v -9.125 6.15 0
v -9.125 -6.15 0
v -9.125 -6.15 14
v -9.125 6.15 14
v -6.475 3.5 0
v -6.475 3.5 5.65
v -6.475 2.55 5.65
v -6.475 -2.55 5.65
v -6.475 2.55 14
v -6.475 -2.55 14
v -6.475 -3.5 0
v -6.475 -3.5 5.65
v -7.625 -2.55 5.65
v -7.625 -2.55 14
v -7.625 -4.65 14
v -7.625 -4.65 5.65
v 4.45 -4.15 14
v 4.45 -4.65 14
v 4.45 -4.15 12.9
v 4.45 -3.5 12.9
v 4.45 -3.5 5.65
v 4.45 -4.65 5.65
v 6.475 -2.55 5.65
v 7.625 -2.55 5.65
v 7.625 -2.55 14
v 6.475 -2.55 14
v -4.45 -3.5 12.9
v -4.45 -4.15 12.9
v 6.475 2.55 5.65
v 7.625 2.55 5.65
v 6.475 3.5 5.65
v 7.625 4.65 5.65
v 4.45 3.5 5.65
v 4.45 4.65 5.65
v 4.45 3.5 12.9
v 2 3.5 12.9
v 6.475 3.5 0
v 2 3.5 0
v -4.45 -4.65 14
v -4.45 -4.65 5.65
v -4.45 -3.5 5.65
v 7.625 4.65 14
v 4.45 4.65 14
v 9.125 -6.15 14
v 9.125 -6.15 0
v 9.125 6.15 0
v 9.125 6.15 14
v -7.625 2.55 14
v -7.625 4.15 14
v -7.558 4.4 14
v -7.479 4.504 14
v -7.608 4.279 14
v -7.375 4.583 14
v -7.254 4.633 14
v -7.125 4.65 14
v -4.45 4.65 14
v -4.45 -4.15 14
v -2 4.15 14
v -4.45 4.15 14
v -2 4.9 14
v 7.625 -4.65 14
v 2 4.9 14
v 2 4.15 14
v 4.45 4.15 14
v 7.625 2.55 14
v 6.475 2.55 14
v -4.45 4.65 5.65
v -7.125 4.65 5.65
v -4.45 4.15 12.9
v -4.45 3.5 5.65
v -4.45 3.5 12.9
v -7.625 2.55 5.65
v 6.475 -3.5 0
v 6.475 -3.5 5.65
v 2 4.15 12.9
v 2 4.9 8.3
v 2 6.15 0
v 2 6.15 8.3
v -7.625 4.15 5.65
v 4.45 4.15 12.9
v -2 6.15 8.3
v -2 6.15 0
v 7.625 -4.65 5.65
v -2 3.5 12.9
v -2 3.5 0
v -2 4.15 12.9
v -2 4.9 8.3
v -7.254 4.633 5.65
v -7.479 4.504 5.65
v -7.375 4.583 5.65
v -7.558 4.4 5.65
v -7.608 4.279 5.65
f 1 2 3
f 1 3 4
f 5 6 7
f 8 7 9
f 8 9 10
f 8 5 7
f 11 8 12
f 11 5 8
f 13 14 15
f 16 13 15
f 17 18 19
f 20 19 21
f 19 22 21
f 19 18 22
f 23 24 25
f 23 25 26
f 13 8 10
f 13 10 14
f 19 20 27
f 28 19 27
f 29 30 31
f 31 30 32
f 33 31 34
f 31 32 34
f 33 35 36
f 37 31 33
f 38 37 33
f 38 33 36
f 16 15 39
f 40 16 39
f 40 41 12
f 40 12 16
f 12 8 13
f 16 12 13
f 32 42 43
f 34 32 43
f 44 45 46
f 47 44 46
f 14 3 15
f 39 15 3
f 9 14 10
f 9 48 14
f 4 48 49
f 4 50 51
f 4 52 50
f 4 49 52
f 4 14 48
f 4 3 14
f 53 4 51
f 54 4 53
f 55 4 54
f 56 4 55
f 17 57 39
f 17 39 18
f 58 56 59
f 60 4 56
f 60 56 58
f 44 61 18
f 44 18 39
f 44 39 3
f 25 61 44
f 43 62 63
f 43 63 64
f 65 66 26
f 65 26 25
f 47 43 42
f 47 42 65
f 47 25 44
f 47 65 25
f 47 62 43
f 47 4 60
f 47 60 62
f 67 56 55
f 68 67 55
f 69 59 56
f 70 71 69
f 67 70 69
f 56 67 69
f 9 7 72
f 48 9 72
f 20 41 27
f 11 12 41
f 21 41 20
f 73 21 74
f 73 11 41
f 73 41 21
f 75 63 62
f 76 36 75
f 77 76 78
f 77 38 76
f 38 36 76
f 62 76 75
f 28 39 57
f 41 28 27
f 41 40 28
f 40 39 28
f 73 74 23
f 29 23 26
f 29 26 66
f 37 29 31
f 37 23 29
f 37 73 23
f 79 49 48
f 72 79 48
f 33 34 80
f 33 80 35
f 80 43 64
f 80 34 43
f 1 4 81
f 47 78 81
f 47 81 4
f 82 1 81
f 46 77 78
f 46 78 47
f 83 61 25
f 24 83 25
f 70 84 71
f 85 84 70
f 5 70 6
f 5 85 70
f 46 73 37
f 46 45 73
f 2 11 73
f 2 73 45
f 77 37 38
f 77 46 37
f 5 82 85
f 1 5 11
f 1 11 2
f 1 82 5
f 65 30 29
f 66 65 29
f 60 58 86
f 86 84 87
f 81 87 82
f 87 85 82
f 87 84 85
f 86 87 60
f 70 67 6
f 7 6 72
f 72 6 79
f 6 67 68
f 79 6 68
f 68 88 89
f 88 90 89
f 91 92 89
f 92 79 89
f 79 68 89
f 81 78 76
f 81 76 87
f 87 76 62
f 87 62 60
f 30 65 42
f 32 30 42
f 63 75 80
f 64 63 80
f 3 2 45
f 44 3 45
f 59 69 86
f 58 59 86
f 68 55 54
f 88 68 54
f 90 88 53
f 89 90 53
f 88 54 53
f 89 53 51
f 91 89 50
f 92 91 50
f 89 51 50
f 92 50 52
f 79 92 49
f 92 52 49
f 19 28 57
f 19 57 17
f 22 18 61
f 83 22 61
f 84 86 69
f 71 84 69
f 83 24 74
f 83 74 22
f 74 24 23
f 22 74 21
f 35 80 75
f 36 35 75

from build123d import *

# Parameters (mm, degrees)
SKETCH1_W               = 18.25
SKETCH1_H               = 12.3
SKETCH1_W_2             = 14.25
SKETCH1_H_2             = 8.3
BOSS_EXTRUDE1_DEPTH     = 14
SKETCH4_W               = 8.9
SKETCH4_H               = 0.65
BOSS_EXTRUDE2_DEPTH     = 12.9
SKETCH4_3_W             = 0.65
SKETCH4_3_H             = 5.1
BOSS_EXTRUDE3_DEPTH     = 14
SKETCH5_W               = 4
SKETCH5_H               = 2.65
CUT_EXTRUDE2_DEPTH      = 8.3
BOSS_EXTRUDE4_DEPTH     = 5.65
SKETCH7_W               = 4
SKETCH7_H               = 1.4
CUT_EXTRUDE3_DEPTH      = 6.7
SKETCH8_R               = 0.5
CUT_EXTRUDE4_DEPTH      = 8.35
MIRROR2_COPY_1_SKETCH_R = 0.5
MIRROR2_COPY_1_DEPTH    = 8.35
CUT_EXTRUDE5_DEPTH      = 8.35


with BuildPart() as part:
    # Sketch1 → Boss-Extrude1 (new body)
    with BuildSketch(Plane.XY):
        Rectangle(SKETCH1_W, SKETCH1_H)
        Rectangle(SKETCH1_W_2, SKETCH1_H_2, mode=Mode.SUBTRACT)
    extrude(amount=BOSS_EXTRUDE1_DEPTH)

    # Sketch4 → Boss-Extrude2 (add)
    with BuildSketch(Plane(origin=(0, 0, 0), x_dir=(-1, 0, 0), z_dir=(0, 0, -1))):
        with Locations((0, 3.825)):
            Rectangle(SKETCH4_W, SKETCH4_H)
        with Locations((0, -3.825)):
            Rectangle(SKETCH4_W, SKETCH4_H)
    extrude(amount=-BOSS_EXTRUDE2_DEPTH)

    # Sketch4<3> → Boss-Extrude3 (add)
    with BuildSketch(Plane(origin=(0, 0, 0), x_dir=(-1, 0, 0), z_dir=(0, 0, -1))):
        with Locations((-6.8, 0)):
            Rectangle(SKETCH4_3_W, SKETCH4_3_H)
        with Locations((6.8, 0)):
            Rectangle(SKETCH4_3_W, SKETCH4_3_H)
    extrude(amount=-BOSS_EXTRUDE3_DEPTH)

    # Sketch5 → Cut-Extrude2 (cut)
    with BuildSketch(Plane(origin=(0, 0, 0), x_dir=(-1, 0, 0), z_dir=(0, 0, -1))):
        with Locations((0, 4.825)):
            Rectangle(SKETCH5_W, SKETCH5_H)
    extrude(amount=-CUT_EXTRUDE2_DEPTH, mode=Mode.SUBTRACT)

    # Sketch6 → Boss-Extrude4 (add)
    with BuildSketch(Plane(origin=(0, 0, 0), x_dir=(-1, 0, 0), z_dir=(0, 0, -1))):
        Polygon((6.475, -3.5), (4.45, -3.5), (4.45, -4.15), (7.125, -4.15), (7.125, -2.55), (6.475, -2.55), align=None)
        Polygon((6.475, 3.5), (6.475, 2.55), (7.125, 2.55), (7.125, 4.15), (4.45, 4.15), (4.45, 3.5), align=None)
        Polygon((-7.125, 2.55), (-6.475, 2.55), (-6.475, 3.5), (-4.45, 3.5), (-4.45, 4.15), (-7.125, 4.15), align=None)
        Polygon((-4.45, -4.15), (-4.45, -3.5), (-6.475, -3.5), (-6.475, -2.55), (-7.125, -2.55), (-7.125, -4.15), align=None)
    extrude(amount=-BOSS_EXTRUDE4_DEPTH)

    # Sketch7 → Cut-Extrude3 (cut, through all)
    with BuildSketch(Plane(origin=(0, 0, 8.3), x_dir=(-1, 0, 0), z_dir=(0, 0, -1))):
        with Locations((0, 4.2)):
            Rectangle(SKETCH7_W, SKETCH7_H)
    extrude(amount=-CUT_EXTRUDE3_DEPTH, mode=Mode.SUBTRACT)

    # Sketch8 → Cut-Extrude4 (cut)
    with BuildSketch(Plane.XY.offset(14)):
        with Locations((-7.125, 4.15)):
            Circle(SKETCH8_R)
    cut_extrude4 = extrude(amount=-CUT_EXTRUDE4_DEPTH, mode=Mode.SUBTRACT)

    # Mirror1: Cut-Extrude4 across plane
    add(cut_extrude4.mirror(Plane.ZX), mode=Mode.SUBTRACT)

    # Mirror2: Cut-Extrude4 across plane
    add(cut_extrude4.mirror(Plane(origin=(0, 0, 0), x_dir=(0, 0, 1), z_dir=(1, 0, 0))), mode=Mode.SUBTRACT)

    # Mirror2 copy 1 sketch → Mirror2 copy 1 (cut)
    with BuildSketch(Plane(origin=(0, 0, 14), x_dir=(-1, 0, 0), z_dir=(0, 0, 1))):
        with Locations((-7.125, 4.15)):
            Circle(MIRROR2_COPY_1_SKETCH_R)
    extrude(amount=-MIRROR2_COPY_1_DEPTH, mode=Mode.SUBTRACT)

    # Sketch9 → Cut-Extrude5 (cut)
    with BuildSketch(Plane.XY.offset(14)):
        with BuildLine():
            ThreePointArc((-7.625, -4.15), (-7.478553391, -4.503553391), (-7.125, -4.65))
            ThreePointArc((-7.125, -4.65), (-6.771446609, -4.503553391), (-6.625, -4.15))
            Line((-6.625, -4.15), (-4.45, -4.15))
            Line((-4.45, -4.15), (-4.45, -2.55))
            Line((-4.45, -2.55), (-6.475, -2.55))
            Line((-6.475, -2.55), (-7.125, -2.55))
            Line((-7.125, -2.55), (-7.125, -3.65))
            ThreePointArc((-7.125, -3.65), (-7.478553391, -3.796446609), (-7.625, -4.15))
        make_face()
        with BuildLine():
            ThreePointArc((-6.625, -4.15), (-6.771446609, -4.503553391), (-7.125, -4.65))
            Line((-7.125, -4.65), (-4.45, -4.65))
            Line((-4.45, -4.65), (-4.45, -4.15))
            Line((-4.45, -4.15), (-6.625, -4.15))
        make_face()
        with BuildLine():
            Line((-7.625, -2.55), (-7.625, -4.15))
            ThreePointArc((-7.625, -4.15), (-7.478553391, -3.796446609), (-7.125, -3.65))
            Line((-7.125, -3.65), (-7.125, -2.55))
            Line((-7.125, -2.55), (-7.625, -2.55))
        make_face()
        with BuildLine():
            Line((-7.625, 4.15), (-7.625, 2.55))
            Line((-7.625, 2.55), (-7.125, 2.55))
            Line((-7.125, 2.55), (-7.125, 3.65))
            ThreePointArc((-7.125, 3.65), (-7.478553391, 3.796446609), (-7.625, 4.15))
        make_face()
        with BuildLine():
            Line((-4.45, 4.65), (-7.125, 4.65))
            ThreePointArc((-7.125, 4.65), (-6.771446609, 4.503553391), (-6.625, 4.15))
            Line((-6.625, 4.15), (-4.45, 4.15))
            Line((-4.45, 4.15), (-4.45, 4.65))
        make_face()
        with BuildLine():
            ThreePointArc((7.125, -3.65), (7.478553391, -3.796446609), (7.625, -4.15))
            Line((7.625, -4.15), (7.625, -2.55))
            Line((7.625, -2.55), (7.125, -2.55))
            Line((7.125, -2.55), (7.125, -3.65))
        make_face()
        with BuildLine():
            Line((6.625, -4.15), (4.45, -4.15))
            Line((4.45, -4.15), (4.45, -4.65))
            Line((4.45, -4.65), (7.125, -4.65))
            ThreePointArc((7.125, -4.65), (6.771446609, -4.503553391), (6.625, -4.15))
        make_face()
        with BuildLine():
            Line((4.45, -2.55), (4.45, -4.15))
            Line((4.45, -4.15), (6.625, -4.15))
            ThreePointArc((6.625, -4.15), (6.771446609, -4.503553391), (7.125, -4.65))
            ThreePointArc((7.125, -4.65), (7.478553391, -4.503553391), (7.625, -4.15))
            ThreePointArc((7.625, -4.15), (7.478553391, -3.796446609), (7.125, -3.65))
            Line((7.125, -3.65), (7.125, -2.55))
            Line((7.125, -2.55), (6.475, -2.55))
            Line((6.475, -2.55), (4.45, -2.55))
        make_face()
        with BuildLine():
            ThreePointArc((7.625, -4.15), (7.478553391, -4.503553391), (7.125, -4.65))
            Line((7.125, -4.65), (7.625, -4.65))
            Line((7.625, -4.65), (7.625, -4.15))
        make_face()
        with BuildLine():
            Line((7.625, 4.65), (7.125, 4.65))
            ThreePointArc((7.125, 4.65), (7.478553391, 4.503553391), (7.625, 4.15))
            Line((7.625, 4.15), (7.625, 4.65))
        make_face()
        with BuildLine():
            Line((7.625, 2.55), (7.625, 4.15))
            ThreePointArc((7.625, 4.15), (7.478553391, 3.796446609), (7.125, 3.65))
            Line((7.125, 3.65), (7.125, 2.55))
            Line((7.125, 2.55), (7.625, 2.55))
        make_face()
        with BuildLine():
            Line((7.125, 4.65), (4.45, 4.65))
            Line((4.45, 4.65), (4.45, 4.15))
            Line((4.45, 4.15), (6.625, 4.15))
            ThreePointArc((6.625, 4.15), (6.771446609, 4.503553391), (7.125, 4.65))
        make_face()
        with BuildLine():
            Line((6.625, 4.15), (4.45, 4.15))
            Line((4.45, 4.15), (4.45, 2.55))
            Line((4.45, 2.55), (6.475, 2.55))
            Line((6.475, 2.55), (7.125, 2.55))
            Line((7.125, 2.55), (7.125, 3.65))
            ThreePointArc((7.125, 3.65), (7.478553391, 3.796446609), (7.625, 4.15))
            ThreePointArc((7.625, 4.15), (7.478553391, 4.503553391), (7.125, 4.65))
            ThreePointArc((7.125, 4.65), (6.771446609, 4.503553391), (6.625, 4.15))
        make_face()
        with BuildLine():
            Line((-7.625, -4.15), (-7.625, -4.65))
            Line((-7.625, -4.65), (-7.125, -4.65))
            ThreePointArc((-7.125, -4.65), (-7.478553391, -4.503553391), (-7.625, -4.15))
        make_face()
    extrude(amount=-CUT_EXTRUDE5_DEPTH, mode=Mode.SUBTRACT)


solid = part.part
